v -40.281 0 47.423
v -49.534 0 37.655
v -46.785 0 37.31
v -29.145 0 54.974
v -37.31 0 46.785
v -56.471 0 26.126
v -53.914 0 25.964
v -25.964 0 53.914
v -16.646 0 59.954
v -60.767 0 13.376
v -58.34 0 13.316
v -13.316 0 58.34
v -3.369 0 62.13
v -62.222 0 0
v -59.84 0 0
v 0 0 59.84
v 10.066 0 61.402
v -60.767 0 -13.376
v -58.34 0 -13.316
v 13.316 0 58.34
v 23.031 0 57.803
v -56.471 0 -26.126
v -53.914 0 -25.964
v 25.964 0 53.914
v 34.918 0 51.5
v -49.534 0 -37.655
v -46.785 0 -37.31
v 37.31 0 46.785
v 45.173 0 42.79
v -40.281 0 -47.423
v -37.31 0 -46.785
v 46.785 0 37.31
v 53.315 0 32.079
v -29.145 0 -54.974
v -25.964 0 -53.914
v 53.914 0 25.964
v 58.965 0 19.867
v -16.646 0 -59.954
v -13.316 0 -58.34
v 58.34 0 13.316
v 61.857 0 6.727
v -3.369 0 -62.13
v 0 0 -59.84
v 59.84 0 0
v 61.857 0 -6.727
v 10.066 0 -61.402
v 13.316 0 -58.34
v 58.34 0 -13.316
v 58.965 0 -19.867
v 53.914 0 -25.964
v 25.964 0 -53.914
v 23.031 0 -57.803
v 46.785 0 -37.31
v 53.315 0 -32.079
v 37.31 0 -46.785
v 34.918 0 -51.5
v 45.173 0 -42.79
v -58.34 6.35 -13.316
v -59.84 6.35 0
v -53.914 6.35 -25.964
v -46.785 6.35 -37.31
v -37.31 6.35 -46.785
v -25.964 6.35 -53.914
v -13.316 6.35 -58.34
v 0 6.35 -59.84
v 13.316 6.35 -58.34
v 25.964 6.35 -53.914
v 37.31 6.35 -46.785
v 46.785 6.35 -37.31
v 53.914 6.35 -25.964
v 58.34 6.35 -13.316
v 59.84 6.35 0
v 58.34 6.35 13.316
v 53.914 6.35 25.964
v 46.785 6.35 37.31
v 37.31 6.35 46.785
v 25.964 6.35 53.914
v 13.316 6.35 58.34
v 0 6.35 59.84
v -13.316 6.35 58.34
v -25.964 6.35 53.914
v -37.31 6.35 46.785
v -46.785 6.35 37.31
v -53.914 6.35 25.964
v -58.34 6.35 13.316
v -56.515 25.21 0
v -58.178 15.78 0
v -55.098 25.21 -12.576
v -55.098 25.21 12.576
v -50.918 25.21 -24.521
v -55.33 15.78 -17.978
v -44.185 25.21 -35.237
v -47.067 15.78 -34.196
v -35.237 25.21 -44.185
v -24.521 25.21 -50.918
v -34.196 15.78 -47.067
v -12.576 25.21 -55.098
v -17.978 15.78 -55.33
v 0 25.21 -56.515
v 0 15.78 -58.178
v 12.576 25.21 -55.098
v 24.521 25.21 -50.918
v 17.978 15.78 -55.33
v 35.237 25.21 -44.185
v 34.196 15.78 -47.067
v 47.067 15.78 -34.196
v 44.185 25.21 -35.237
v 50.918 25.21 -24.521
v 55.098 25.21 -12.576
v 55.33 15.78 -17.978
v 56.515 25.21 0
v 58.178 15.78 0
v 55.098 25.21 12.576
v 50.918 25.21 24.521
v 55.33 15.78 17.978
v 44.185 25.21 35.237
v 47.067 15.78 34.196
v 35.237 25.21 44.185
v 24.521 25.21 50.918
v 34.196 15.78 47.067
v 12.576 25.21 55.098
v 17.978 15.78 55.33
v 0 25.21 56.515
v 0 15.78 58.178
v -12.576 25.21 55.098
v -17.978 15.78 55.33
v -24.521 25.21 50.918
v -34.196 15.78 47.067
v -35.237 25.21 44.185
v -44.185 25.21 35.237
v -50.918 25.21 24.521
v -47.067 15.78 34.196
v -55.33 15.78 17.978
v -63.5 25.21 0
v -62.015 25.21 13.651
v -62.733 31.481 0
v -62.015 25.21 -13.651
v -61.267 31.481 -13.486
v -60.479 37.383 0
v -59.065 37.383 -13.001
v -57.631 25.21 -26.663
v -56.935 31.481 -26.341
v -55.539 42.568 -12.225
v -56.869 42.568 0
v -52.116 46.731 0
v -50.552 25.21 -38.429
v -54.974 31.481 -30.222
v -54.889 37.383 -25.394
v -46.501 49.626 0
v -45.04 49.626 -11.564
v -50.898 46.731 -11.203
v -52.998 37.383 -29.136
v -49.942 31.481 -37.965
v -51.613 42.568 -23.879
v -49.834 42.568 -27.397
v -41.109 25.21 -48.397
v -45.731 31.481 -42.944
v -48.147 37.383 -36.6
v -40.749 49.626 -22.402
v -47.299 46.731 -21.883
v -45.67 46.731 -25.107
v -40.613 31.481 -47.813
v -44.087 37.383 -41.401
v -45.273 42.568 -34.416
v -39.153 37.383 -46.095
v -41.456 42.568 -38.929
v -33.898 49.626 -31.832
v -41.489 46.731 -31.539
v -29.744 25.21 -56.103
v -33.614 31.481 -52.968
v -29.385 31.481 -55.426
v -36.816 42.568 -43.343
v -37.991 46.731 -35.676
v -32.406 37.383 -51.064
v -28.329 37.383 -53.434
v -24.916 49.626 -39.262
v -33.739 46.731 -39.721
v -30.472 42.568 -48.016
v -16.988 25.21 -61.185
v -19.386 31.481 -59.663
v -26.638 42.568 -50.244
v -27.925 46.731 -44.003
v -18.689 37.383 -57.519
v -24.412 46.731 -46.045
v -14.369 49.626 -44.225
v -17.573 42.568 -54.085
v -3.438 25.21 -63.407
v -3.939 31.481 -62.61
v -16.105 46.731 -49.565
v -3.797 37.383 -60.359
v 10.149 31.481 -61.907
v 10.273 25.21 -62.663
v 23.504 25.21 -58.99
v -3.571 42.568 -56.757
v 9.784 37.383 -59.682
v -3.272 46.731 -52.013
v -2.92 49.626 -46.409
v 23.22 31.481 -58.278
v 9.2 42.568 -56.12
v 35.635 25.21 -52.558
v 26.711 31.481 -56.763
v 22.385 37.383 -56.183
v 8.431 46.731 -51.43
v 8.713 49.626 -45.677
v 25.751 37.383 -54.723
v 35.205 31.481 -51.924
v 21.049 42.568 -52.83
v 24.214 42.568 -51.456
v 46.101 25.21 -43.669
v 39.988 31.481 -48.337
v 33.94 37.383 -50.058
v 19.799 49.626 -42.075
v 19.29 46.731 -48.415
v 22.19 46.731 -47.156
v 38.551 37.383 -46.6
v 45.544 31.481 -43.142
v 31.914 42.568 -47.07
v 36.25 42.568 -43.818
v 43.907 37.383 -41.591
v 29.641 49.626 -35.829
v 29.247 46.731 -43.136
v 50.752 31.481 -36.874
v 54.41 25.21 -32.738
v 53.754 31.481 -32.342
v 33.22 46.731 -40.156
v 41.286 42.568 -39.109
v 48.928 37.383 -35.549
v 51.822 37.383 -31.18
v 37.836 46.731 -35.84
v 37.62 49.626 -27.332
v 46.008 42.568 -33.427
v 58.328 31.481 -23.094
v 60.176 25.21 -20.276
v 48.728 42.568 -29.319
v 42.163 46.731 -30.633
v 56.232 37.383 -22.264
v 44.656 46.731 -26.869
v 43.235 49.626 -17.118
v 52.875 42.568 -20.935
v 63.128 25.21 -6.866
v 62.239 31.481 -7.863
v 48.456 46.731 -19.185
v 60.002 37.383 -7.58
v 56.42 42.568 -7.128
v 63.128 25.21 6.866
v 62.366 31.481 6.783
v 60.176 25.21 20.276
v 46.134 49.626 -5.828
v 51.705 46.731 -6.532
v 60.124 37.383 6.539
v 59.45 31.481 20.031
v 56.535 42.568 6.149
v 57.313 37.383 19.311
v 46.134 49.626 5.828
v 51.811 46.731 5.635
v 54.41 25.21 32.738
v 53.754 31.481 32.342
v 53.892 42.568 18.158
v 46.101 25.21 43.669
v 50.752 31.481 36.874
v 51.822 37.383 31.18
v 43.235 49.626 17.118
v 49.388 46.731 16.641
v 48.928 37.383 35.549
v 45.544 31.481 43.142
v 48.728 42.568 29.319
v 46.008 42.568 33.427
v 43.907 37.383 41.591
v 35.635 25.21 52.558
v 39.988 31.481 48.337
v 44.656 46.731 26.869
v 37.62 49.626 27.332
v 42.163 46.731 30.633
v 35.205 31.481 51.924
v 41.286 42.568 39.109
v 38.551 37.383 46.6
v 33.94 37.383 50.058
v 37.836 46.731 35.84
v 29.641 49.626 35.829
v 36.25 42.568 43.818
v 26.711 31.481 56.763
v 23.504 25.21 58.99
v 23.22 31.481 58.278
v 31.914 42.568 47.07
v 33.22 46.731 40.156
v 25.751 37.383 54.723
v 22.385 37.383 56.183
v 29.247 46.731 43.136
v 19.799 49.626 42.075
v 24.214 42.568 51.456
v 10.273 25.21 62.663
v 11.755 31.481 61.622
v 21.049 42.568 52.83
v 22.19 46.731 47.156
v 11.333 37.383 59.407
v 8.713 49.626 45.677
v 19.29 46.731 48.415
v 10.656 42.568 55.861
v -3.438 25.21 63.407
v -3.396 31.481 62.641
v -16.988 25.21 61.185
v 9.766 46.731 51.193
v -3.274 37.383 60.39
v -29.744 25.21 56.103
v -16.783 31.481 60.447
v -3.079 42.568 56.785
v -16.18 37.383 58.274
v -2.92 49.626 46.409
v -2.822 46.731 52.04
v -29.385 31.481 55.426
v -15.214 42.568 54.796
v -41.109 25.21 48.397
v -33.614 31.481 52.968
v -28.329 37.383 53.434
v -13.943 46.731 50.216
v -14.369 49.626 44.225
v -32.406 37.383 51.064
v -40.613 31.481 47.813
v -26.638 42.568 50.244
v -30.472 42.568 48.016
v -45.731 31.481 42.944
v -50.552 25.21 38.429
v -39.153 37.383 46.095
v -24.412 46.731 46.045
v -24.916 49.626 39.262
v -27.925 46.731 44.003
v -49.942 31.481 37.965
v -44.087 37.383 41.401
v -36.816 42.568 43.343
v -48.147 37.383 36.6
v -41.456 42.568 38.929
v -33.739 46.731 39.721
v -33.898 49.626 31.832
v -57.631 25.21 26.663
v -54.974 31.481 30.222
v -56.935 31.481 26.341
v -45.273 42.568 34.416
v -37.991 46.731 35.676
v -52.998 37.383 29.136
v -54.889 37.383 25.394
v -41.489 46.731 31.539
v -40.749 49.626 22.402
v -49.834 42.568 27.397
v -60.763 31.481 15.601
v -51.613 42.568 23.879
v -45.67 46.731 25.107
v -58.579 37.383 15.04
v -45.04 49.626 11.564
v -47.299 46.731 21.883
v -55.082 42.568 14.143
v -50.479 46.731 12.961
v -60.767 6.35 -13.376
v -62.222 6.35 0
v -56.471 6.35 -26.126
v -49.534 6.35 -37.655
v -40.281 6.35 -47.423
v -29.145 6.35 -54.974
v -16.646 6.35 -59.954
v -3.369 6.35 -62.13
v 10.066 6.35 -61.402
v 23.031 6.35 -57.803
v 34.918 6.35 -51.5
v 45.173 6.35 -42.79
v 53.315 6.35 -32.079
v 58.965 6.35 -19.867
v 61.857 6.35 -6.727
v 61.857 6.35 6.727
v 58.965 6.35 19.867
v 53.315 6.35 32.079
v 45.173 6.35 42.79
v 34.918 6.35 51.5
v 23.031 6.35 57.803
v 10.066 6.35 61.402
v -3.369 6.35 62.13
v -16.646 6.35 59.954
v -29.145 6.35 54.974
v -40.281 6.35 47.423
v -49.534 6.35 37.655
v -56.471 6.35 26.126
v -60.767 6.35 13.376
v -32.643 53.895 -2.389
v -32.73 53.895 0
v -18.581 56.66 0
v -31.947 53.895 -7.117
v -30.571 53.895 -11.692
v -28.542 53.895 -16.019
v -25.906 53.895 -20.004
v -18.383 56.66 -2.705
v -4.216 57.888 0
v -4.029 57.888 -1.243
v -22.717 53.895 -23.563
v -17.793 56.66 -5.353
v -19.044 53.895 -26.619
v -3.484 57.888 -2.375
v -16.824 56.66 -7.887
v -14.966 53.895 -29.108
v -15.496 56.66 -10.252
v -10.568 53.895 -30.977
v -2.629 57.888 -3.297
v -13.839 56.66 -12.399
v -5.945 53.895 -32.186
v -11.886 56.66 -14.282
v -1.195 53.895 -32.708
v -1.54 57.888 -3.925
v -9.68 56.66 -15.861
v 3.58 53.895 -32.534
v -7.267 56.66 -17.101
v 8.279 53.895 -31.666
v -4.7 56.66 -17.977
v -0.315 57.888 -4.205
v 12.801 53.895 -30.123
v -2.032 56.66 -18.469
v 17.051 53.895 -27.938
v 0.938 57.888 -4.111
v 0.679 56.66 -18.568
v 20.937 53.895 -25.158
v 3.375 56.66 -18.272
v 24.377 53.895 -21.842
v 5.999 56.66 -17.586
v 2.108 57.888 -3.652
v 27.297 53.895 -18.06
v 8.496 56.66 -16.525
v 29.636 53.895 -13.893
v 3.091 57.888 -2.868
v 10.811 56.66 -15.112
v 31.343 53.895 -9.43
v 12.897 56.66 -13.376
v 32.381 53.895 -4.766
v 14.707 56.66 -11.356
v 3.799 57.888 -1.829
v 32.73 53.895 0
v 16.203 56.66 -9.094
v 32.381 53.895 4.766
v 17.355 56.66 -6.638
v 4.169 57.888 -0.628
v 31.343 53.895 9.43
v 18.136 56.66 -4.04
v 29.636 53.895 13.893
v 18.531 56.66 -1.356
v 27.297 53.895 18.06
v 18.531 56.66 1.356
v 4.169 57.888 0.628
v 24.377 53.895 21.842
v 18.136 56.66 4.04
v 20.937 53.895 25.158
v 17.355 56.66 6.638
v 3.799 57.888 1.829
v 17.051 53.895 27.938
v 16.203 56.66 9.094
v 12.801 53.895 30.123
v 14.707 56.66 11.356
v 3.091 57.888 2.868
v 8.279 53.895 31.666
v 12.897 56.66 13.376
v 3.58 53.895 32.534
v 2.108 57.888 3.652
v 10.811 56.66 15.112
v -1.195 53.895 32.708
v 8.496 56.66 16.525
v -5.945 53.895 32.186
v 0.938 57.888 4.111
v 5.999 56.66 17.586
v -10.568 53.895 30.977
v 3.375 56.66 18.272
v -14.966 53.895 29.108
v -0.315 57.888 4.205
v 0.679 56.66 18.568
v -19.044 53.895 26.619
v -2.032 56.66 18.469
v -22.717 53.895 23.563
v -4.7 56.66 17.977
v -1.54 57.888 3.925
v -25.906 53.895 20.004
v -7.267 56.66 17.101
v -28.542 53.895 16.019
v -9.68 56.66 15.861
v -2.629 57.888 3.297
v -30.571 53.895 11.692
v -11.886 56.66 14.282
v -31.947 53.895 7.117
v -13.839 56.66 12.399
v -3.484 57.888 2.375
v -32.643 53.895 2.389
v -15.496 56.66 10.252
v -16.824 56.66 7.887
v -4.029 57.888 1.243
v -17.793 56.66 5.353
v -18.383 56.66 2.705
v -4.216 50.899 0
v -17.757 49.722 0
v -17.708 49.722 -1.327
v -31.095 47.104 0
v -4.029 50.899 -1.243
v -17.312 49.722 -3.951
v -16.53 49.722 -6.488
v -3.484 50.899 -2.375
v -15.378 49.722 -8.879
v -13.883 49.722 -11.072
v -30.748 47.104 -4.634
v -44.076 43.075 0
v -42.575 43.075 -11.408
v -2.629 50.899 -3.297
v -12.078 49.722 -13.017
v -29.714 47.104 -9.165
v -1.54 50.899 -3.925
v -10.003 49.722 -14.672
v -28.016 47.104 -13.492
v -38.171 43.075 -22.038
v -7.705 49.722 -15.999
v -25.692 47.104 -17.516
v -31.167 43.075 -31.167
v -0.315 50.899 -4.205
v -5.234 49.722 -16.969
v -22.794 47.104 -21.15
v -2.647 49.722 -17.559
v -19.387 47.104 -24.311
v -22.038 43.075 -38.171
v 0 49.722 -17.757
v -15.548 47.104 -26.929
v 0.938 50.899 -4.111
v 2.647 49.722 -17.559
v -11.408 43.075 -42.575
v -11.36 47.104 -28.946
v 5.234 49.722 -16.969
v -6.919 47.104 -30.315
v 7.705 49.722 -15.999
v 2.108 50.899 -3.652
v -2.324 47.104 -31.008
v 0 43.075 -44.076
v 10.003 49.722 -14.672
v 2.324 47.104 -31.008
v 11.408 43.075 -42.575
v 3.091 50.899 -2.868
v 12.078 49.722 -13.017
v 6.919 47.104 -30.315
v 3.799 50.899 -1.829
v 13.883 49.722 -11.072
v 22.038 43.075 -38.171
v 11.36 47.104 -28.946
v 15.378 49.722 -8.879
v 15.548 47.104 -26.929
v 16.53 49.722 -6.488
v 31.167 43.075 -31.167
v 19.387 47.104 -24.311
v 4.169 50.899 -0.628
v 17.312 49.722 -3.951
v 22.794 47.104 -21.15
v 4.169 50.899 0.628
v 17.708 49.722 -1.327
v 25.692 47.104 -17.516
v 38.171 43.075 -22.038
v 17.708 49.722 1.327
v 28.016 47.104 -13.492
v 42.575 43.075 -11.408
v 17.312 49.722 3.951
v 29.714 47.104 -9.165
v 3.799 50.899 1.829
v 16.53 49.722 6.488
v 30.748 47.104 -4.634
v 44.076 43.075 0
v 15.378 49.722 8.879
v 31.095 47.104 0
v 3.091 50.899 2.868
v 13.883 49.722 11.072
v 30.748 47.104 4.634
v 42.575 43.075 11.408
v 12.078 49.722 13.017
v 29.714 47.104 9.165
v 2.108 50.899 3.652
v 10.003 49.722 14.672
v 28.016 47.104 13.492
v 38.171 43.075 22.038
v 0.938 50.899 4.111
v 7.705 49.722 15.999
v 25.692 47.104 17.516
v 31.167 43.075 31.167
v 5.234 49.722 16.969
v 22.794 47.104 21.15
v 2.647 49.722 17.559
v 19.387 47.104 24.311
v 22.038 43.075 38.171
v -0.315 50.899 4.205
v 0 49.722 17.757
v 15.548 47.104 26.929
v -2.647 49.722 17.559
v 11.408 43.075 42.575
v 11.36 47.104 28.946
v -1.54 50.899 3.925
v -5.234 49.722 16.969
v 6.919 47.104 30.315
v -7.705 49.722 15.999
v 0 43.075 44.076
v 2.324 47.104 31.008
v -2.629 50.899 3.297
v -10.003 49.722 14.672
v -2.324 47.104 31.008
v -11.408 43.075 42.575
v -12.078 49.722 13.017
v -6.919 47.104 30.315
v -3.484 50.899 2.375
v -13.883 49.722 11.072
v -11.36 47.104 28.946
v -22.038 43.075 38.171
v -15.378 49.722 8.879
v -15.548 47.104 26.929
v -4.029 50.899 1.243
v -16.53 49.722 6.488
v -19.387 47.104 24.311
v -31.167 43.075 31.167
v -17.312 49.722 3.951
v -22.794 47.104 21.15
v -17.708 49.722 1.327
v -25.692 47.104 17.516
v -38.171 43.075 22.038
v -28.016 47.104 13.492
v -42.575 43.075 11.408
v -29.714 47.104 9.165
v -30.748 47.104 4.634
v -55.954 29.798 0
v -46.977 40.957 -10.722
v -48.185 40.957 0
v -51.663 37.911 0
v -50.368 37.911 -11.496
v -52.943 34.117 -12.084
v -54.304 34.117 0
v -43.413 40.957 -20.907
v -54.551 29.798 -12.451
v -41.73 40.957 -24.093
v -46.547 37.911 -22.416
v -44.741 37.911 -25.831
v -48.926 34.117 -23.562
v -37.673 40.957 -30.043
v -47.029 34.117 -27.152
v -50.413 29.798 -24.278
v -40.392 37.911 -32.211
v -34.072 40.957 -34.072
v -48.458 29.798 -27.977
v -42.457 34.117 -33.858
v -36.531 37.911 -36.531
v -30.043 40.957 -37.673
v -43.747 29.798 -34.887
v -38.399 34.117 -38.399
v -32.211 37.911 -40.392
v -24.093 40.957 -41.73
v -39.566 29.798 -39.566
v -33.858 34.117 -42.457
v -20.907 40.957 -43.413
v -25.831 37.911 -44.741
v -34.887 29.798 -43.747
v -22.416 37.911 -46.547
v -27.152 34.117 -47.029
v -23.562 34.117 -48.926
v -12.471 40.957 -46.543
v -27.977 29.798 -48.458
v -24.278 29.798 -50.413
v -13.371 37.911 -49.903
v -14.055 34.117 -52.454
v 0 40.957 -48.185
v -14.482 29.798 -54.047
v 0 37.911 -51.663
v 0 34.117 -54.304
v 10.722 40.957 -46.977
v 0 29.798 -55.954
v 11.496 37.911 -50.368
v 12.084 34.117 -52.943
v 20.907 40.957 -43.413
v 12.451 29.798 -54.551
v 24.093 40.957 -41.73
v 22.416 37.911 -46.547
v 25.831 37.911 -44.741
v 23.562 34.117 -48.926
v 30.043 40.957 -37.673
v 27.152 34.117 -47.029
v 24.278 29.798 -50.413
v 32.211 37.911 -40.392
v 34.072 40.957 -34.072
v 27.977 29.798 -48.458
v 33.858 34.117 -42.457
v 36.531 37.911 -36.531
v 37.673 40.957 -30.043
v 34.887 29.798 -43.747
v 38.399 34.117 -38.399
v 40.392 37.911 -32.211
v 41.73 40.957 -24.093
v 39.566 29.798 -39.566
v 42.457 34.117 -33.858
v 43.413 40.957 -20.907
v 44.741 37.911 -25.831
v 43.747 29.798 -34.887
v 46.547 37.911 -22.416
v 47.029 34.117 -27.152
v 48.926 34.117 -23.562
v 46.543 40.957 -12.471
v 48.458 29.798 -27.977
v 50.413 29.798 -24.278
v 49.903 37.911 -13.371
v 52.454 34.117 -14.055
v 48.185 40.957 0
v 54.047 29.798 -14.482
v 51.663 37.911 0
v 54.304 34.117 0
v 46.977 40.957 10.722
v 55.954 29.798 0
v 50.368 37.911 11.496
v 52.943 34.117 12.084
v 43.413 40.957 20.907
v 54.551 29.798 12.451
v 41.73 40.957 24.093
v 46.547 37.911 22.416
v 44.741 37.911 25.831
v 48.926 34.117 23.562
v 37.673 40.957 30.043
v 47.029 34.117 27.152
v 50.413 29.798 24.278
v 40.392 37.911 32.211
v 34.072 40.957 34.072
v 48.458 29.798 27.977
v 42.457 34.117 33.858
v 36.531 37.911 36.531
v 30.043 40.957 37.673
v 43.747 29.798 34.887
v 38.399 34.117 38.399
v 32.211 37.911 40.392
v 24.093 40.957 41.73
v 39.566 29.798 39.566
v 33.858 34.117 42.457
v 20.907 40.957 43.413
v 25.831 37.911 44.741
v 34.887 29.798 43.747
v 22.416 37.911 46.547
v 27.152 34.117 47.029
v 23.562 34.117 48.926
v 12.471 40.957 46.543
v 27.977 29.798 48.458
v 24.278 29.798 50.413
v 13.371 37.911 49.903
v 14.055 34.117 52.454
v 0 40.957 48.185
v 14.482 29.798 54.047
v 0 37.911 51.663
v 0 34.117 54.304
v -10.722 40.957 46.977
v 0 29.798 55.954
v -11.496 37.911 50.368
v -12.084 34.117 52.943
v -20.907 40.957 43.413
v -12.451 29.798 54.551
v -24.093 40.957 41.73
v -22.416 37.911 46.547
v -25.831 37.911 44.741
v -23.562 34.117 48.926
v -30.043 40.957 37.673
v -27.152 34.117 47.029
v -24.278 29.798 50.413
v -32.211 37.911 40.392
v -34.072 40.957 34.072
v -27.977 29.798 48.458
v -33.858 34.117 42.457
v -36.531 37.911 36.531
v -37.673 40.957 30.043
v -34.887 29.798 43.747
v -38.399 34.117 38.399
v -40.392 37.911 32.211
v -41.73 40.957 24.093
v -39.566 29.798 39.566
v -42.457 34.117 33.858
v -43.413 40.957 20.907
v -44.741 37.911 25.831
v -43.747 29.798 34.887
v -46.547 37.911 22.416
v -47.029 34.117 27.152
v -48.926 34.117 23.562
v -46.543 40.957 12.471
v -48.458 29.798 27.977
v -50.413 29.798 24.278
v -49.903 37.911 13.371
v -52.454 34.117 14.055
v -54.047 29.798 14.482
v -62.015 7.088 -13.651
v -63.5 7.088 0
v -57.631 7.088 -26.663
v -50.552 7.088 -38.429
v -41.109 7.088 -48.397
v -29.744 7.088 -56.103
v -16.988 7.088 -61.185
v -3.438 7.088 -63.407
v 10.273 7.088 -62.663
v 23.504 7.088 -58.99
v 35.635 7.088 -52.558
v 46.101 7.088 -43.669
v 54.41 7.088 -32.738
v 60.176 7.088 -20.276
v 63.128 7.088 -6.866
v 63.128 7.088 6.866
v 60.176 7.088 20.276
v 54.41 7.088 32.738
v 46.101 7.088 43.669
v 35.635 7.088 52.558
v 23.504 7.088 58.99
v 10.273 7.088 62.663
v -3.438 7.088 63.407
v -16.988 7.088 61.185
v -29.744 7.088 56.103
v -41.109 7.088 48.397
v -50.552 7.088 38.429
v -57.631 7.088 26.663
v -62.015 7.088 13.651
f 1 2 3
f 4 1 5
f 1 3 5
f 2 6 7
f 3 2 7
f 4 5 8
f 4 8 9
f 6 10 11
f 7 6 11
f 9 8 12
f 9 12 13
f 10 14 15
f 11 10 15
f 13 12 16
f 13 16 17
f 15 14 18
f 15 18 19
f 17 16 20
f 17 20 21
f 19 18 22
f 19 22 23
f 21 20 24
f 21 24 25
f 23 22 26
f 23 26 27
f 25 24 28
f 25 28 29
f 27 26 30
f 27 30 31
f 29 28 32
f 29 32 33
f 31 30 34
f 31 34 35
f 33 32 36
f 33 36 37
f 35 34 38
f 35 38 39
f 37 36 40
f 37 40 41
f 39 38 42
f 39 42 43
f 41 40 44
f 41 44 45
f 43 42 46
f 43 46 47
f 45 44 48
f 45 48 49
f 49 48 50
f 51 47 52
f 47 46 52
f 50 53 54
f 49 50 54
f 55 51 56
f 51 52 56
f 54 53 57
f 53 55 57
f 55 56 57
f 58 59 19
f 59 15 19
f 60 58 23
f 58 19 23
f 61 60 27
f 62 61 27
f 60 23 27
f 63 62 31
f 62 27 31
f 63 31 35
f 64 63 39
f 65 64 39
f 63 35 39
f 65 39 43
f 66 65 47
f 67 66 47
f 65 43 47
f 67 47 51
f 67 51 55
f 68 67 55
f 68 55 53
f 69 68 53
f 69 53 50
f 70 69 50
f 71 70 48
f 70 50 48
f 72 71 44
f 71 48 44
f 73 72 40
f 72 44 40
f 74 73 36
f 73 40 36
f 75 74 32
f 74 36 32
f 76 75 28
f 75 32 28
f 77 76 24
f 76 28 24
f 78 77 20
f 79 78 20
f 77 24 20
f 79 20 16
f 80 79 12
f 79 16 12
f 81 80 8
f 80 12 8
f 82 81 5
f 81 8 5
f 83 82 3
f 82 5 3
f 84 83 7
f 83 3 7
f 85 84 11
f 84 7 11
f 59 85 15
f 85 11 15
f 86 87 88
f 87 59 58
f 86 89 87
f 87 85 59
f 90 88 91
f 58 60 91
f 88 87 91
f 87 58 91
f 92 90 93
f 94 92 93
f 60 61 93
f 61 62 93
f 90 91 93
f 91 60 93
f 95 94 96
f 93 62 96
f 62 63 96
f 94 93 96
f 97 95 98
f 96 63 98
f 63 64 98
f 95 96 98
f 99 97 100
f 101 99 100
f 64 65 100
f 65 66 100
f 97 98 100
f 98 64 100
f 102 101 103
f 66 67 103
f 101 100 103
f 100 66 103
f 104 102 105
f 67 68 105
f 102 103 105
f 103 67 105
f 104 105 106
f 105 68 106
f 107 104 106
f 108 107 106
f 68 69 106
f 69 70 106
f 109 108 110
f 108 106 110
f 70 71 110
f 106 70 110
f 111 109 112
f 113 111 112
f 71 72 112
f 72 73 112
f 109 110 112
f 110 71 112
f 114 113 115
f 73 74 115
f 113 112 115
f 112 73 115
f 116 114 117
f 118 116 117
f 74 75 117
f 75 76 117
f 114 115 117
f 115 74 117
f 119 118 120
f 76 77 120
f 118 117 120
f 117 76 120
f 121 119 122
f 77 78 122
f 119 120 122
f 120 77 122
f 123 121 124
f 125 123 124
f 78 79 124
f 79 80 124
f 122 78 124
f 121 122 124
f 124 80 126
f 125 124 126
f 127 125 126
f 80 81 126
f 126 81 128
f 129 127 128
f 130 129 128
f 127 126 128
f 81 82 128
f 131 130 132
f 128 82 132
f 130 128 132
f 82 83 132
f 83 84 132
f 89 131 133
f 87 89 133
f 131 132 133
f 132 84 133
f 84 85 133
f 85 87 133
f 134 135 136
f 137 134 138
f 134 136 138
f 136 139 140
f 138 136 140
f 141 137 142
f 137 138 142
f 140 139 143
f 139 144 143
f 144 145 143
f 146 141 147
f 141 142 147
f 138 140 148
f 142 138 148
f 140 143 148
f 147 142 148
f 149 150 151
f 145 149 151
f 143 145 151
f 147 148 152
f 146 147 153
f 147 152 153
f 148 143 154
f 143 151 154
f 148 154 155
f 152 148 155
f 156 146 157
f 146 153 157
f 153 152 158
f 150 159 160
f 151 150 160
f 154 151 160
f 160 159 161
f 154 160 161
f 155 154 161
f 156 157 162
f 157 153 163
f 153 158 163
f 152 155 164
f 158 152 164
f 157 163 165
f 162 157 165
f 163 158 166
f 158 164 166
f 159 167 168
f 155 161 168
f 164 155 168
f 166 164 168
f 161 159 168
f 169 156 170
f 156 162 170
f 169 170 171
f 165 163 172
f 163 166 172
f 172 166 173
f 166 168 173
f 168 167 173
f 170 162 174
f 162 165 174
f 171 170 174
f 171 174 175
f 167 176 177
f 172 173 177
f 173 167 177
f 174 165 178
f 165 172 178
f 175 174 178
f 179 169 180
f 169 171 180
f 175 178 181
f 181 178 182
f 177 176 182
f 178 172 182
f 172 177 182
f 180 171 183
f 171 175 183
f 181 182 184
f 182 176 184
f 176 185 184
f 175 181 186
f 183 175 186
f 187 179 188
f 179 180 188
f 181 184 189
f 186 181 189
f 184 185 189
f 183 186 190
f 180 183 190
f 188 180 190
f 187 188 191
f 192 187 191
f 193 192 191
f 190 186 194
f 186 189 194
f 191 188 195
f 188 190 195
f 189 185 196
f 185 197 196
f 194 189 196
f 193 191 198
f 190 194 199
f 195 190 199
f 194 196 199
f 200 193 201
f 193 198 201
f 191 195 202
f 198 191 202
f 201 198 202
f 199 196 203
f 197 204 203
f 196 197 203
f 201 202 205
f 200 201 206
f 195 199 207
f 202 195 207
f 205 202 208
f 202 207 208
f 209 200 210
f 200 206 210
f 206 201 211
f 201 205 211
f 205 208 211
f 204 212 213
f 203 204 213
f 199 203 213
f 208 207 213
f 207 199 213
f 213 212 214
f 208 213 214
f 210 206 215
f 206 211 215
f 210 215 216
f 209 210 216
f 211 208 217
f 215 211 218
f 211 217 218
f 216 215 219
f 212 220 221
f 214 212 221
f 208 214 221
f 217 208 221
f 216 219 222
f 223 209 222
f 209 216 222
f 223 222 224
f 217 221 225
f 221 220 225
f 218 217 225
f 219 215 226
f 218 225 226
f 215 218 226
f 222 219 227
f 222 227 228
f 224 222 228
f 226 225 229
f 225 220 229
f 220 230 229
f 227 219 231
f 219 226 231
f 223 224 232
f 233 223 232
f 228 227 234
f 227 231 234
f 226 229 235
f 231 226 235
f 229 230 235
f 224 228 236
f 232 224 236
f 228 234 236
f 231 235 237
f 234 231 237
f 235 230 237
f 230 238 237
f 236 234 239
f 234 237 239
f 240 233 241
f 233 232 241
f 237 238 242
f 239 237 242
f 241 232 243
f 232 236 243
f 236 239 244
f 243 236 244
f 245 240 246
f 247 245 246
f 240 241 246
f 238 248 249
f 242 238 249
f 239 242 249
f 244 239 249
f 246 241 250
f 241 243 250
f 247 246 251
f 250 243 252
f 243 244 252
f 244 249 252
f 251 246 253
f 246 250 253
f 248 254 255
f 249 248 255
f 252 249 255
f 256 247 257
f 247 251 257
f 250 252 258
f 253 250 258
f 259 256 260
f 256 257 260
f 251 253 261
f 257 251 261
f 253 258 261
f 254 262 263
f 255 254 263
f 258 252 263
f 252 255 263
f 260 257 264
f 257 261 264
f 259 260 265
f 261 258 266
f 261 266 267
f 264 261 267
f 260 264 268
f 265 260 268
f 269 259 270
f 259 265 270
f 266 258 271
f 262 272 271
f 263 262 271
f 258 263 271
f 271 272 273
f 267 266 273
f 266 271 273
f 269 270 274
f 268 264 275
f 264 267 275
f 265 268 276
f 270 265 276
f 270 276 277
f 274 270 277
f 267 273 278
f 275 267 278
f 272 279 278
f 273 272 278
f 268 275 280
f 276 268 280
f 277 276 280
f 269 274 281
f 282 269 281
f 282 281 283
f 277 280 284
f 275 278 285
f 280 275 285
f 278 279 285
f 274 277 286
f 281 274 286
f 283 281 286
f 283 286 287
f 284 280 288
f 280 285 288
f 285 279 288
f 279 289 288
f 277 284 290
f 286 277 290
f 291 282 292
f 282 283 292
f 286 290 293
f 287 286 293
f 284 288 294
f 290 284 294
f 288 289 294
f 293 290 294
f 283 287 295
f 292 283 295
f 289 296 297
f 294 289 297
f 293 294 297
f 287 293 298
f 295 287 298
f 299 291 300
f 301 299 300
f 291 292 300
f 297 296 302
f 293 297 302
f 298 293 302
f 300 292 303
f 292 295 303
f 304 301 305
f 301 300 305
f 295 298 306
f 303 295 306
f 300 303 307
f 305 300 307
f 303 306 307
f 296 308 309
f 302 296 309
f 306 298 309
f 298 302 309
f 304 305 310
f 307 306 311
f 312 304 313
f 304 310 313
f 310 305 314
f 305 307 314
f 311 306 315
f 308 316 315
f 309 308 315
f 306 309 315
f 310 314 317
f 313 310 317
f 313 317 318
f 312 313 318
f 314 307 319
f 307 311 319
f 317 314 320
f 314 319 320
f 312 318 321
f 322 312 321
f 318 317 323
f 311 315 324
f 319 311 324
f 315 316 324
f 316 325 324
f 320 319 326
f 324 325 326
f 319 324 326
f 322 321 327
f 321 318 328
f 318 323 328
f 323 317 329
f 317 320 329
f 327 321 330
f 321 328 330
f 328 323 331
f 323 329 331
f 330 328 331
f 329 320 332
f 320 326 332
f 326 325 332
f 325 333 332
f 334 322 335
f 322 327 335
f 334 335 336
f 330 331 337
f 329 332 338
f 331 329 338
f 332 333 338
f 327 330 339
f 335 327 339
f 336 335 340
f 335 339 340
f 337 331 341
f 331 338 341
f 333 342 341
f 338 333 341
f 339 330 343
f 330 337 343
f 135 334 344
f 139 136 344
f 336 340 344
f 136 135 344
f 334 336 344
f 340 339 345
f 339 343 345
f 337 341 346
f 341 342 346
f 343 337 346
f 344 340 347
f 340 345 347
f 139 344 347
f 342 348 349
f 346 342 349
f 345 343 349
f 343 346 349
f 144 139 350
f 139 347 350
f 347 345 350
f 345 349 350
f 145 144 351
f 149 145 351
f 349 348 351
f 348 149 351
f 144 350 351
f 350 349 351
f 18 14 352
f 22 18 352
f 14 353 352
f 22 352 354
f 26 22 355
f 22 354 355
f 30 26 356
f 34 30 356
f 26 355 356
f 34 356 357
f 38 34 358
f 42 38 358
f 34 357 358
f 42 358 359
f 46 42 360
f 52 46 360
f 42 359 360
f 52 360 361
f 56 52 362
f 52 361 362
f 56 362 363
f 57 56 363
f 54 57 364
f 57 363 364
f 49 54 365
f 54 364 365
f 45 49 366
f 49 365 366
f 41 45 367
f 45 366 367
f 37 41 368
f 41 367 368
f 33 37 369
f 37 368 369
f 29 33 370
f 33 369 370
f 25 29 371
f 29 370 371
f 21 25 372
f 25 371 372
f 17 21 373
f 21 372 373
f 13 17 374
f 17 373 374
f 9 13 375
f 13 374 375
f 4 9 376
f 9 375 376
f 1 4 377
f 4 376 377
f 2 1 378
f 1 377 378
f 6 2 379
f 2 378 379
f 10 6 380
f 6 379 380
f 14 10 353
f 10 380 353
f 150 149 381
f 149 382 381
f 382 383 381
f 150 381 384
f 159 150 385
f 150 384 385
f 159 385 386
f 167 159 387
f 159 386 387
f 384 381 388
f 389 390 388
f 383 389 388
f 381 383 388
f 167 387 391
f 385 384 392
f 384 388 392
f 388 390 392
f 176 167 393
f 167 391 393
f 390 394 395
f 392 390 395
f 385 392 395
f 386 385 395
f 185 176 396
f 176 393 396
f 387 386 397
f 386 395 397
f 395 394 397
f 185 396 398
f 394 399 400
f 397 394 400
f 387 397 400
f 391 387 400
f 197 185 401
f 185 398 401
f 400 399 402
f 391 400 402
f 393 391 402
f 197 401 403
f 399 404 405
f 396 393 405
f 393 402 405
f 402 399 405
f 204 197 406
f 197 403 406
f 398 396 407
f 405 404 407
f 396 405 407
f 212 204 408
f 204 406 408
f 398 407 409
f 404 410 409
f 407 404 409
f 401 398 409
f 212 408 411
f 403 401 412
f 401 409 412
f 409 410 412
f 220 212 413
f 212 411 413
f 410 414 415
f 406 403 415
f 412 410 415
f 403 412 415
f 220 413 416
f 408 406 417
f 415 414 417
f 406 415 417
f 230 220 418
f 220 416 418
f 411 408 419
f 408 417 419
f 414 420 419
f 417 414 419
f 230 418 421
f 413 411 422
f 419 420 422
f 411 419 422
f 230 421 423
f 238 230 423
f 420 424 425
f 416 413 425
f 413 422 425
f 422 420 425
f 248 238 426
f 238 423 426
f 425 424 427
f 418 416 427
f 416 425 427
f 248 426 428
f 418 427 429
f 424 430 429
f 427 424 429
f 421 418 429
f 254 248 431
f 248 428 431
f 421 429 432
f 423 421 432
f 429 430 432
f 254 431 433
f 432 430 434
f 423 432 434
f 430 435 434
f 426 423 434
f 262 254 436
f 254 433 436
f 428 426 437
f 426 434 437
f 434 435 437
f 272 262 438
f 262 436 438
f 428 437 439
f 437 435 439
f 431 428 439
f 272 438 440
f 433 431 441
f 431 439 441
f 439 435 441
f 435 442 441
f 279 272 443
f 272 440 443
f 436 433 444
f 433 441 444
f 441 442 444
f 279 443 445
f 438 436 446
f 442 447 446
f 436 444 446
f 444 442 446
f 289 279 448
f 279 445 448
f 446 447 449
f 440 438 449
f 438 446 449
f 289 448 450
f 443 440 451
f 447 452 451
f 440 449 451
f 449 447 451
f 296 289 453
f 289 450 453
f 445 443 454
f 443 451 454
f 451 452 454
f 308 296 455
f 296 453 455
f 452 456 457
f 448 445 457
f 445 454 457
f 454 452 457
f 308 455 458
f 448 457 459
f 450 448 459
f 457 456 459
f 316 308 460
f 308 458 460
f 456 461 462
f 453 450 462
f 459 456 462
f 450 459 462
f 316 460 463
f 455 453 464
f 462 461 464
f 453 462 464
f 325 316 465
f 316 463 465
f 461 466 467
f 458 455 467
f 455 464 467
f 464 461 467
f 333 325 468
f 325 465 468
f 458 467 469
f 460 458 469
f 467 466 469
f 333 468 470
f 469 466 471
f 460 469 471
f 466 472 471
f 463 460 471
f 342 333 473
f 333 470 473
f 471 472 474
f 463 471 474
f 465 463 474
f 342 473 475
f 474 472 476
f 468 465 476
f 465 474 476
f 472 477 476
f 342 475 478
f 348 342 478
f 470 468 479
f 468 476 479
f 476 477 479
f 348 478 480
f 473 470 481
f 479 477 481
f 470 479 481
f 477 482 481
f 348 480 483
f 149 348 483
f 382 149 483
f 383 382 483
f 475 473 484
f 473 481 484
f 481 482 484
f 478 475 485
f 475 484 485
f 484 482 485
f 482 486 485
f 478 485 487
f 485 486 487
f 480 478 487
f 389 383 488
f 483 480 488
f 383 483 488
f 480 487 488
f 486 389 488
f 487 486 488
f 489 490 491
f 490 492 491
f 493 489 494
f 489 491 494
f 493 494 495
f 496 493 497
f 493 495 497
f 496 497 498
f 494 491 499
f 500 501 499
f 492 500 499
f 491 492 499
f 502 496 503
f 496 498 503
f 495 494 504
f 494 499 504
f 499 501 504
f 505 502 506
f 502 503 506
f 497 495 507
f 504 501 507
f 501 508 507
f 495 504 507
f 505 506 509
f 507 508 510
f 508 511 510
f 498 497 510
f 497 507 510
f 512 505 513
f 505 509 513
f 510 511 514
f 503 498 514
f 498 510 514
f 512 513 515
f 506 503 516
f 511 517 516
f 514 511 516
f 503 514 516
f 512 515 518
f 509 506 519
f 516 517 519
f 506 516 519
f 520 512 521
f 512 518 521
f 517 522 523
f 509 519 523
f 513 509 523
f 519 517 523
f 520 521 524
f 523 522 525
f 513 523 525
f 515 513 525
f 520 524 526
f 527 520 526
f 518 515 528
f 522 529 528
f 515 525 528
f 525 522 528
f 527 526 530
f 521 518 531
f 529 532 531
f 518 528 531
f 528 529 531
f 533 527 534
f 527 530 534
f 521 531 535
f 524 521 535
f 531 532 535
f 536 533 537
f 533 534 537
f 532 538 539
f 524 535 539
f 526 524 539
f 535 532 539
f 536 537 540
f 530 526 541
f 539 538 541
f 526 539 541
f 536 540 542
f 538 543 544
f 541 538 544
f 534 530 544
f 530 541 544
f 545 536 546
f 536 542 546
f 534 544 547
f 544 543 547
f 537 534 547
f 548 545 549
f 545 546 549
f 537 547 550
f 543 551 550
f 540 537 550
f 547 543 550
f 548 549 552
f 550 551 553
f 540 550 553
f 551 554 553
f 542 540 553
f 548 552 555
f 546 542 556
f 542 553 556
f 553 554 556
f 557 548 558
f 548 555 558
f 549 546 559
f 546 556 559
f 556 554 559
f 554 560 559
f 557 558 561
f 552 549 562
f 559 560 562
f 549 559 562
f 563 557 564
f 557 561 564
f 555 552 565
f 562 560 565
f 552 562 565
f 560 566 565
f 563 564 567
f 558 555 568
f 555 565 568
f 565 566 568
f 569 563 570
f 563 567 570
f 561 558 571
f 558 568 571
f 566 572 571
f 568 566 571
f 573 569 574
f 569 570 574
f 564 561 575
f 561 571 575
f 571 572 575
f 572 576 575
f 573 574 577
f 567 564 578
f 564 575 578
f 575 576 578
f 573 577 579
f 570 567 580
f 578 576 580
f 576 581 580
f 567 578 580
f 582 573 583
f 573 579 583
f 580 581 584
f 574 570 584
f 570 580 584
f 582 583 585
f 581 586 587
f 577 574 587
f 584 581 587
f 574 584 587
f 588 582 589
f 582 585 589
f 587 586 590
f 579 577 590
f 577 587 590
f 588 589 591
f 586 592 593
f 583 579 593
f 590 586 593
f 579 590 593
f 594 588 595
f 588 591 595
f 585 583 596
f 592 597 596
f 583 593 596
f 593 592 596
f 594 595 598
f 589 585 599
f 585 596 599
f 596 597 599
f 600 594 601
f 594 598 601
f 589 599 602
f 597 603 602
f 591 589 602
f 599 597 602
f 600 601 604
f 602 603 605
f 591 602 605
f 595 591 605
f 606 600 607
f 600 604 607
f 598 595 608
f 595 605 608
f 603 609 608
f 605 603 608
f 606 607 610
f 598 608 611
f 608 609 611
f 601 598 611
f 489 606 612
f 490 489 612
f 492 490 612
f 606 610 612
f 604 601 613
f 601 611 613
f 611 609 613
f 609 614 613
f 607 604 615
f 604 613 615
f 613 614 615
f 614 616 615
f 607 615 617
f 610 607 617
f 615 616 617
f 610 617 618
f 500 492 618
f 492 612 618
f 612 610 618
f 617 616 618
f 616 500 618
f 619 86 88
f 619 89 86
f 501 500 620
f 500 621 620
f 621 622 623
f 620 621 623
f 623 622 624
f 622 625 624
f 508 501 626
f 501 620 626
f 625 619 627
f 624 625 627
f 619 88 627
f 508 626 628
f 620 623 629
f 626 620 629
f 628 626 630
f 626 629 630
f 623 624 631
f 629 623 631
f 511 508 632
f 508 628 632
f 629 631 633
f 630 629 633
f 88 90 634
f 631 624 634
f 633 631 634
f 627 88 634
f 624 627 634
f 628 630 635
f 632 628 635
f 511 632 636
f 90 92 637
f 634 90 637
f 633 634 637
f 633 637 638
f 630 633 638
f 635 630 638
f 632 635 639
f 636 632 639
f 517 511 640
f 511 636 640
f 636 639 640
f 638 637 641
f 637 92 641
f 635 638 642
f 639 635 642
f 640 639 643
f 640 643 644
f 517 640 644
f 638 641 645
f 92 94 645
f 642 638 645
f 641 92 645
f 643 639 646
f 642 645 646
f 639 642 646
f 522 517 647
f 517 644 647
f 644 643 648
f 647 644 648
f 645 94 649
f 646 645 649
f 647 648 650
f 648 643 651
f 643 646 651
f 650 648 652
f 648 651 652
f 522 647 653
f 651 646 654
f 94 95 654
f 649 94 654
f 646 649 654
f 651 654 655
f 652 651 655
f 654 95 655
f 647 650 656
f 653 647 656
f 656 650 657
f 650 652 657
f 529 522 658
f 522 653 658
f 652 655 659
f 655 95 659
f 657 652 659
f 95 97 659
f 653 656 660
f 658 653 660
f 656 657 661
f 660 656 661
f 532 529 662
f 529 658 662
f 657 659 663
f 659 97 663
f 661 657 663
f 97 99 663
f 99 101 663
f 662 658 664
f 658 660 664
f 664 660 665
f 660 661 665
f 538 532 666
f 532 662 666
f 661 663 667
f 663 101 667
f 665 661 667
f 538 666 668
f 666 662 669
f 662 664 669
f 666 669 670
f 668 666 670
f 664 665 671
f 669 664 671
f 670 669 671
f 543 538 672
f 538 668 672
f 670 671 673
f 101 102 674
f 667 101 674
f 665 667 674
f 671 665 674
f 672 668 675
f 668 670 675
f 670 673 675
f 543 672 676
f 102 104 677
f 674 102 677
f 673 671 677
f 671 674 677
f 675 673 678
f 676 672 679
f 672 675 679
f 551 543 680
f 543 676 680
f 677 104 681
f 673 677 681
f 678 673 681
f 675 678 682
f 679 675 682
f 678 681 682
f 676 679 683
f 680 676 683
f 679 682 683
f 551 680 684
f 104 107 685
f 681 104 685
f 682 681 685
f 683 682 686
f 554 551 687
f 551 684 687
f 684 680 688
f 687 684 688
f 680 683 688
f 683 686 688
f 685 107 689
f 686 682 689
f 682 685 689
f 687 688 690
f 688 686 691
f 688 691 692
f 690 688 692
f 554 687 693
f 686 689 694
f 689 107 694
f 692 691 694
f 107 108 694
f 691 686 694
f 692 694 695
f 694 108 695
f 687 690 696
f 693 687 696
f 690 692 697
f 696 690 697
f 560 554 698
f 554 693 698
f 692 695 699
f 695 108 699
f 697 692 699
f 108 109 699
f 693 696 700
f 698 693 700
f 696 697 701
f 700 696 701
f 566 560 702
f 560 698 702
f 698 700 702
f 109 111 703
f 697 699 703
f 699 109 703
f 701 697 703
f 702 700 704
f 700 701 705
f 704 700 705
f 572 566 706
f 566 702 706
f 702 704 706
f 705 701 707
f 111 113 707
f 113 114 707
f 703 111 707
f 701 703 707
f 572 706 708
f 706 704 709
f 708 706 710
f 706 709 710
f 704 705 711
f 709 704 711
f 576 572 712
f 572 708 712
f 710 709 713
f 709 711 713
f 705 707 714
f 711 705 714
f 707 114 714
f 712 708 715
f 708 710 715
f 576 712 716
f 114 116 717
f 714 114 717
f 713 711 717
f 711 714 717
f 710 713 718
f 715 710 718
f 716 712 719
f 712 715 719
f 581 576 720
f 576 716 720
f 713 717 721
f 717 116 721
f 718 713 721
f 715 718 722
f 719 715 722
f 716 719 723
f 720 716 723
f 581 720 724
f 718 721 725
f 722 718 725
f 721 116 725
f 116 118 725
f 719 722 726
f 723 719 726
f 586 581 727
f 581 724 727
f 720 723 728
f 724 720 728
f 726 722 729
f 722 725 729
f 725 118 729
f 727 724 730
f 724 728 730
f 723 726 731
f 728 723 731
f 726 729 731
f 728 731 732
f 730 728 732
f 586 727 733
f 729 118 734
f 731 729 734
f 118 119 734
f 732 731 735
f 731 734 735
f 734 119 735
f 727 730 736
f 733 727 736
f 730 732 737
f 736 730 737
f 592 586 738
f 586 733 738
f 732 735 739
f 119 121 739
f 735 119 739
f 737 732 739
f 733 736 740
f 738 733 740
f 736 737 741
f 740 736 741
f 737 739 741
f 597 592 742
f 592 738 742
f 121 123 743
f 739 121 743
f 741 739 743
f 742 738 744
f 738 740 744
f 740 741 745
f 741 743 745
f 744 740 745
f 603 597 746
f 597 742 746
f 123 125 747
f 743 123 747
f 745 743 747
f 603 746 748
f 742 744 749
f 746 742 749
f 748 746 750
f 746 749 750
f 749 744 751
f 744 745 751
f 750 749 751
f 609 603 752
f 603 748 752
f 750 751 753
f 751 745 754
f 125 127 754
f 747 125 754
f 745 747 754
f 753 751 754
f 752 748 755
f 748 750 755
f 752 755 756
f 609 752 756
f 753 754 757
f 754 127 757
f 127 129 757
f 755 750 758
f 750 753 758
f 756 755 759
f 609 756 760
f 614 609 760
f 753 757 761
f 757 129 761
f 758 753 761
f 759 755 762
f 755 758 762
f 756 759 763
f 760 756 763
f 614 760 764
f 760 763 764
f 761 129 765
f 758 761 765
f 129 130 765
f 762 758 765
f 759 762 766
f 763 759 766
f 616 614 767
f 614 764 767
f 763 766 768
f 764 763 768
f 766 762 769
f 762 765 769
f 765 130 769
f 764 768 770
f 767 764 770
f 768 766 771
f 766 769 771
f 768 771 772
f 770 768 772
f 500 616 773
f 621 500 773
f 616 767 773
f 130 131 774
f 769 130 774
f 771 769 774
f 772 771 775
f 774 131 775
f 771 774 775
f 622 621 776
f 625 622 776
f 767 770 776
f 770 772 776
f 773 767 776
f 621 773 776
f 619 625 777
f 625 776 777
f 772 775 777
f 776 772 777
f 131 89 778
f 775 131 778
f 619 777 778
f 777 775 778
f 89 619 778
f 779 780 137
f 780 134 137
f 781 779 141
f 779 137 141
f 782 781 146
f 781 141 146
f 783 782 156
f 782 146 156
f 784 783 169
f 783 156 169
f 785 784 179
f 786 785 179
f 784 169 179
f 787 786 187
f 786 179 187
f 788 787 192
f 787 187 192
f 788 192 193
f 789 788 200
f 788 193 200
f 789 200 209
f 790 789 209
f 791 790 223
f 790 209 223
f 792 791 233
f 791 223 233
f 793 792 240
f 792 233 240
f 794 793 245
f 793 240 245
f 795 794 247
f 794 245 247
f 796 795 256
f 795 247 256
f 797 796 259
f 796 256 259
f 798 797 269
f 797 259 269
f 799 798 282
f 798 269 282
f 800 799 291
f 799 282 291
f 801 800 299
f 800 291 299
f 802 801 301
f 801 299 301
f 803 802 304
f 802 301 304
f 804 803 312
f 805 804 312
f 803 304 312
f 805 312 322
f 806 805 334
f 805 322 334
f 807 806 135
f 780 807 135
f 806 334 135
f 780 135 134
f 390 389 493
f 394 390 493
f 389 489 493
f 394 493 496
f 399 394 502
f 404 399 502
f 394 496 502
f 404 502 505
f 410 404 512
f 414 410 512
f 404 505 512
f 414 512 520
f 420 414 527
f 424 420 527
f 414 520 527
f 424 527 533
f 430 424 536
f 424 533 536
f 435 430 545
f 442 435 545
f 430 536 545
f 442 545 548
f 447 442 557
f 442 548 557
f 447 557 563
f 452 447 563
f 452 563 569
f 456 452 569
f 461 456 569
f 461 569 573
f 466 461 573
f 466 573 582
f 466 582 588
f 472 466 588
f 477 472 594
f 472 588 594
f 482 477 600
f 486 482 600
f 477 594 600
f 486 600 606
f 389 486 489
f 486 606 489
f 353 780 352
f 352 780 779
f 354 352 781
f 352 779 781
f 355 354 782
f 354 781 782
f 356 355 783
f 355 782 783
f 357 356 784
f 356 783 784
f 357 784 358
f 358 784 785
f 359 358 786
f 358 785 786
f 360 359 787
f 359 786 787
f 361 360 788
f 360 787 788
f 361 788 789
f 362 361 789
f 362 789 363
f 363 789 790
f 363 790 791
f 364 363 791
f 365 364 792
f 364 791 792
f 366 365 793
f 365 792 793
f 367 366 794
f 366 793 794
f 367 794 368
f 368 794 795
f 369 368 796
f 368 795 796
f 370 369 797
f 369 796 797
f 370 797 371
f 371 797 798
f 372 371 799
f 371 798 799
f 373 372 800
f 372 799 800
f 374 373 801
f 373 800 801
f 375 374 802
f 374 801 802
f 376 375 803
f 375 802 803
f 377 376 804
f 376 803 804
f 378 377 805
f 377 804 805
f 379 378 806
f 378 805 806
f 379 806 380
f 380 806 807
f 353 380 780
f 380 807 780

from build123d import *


with BuildPart() as part:
    # Sketch1 → Revolve2 (revolve)
    with BuildSketch(Plane.XY):
        with BuildLine():
            Line((-63.5, 7.0880256), (-63.5, 25.209576395))
            ThreePointArc((-63.5, 25.209576395), (-58.831621889, 40.085351805), (-46.500676471, 49.626328344))
            ThreePointArc((-46.500676471, 49.626328344), (-25.692788323, 55.467905735), (-4.2164, 57.8880256))
            Line((-4.2164, 57.8880256), (-4.2164, 50.899373851))
            ThreePointArc((-4.2164, 50.899373851), (-24.461267699, 48.591399426), (-44.076470588, 43.075492455))
            ThreePointArc((-44.076470588, 43.075492455), (-53.099113577, 36.09429011), (-56.515, 25.209576395))
            Line((-56.515, 25.209576395), (-59.840452163, 6.35))
            Line((-59.840452163, 6.35), (-59.840452163, 0))
            Line((-59.840452163, 0), (-62.221702163, 0))
            Line((-62.221702163, 0), (-62.221702163, 6.35))
            Line((-62.221702163, 6.35), (-63.5, 7.0880256))
        make_face()
    revolve(axis=Axis((0, 127.060987048, 0), (0, -1, 0)))


solid = part.part
